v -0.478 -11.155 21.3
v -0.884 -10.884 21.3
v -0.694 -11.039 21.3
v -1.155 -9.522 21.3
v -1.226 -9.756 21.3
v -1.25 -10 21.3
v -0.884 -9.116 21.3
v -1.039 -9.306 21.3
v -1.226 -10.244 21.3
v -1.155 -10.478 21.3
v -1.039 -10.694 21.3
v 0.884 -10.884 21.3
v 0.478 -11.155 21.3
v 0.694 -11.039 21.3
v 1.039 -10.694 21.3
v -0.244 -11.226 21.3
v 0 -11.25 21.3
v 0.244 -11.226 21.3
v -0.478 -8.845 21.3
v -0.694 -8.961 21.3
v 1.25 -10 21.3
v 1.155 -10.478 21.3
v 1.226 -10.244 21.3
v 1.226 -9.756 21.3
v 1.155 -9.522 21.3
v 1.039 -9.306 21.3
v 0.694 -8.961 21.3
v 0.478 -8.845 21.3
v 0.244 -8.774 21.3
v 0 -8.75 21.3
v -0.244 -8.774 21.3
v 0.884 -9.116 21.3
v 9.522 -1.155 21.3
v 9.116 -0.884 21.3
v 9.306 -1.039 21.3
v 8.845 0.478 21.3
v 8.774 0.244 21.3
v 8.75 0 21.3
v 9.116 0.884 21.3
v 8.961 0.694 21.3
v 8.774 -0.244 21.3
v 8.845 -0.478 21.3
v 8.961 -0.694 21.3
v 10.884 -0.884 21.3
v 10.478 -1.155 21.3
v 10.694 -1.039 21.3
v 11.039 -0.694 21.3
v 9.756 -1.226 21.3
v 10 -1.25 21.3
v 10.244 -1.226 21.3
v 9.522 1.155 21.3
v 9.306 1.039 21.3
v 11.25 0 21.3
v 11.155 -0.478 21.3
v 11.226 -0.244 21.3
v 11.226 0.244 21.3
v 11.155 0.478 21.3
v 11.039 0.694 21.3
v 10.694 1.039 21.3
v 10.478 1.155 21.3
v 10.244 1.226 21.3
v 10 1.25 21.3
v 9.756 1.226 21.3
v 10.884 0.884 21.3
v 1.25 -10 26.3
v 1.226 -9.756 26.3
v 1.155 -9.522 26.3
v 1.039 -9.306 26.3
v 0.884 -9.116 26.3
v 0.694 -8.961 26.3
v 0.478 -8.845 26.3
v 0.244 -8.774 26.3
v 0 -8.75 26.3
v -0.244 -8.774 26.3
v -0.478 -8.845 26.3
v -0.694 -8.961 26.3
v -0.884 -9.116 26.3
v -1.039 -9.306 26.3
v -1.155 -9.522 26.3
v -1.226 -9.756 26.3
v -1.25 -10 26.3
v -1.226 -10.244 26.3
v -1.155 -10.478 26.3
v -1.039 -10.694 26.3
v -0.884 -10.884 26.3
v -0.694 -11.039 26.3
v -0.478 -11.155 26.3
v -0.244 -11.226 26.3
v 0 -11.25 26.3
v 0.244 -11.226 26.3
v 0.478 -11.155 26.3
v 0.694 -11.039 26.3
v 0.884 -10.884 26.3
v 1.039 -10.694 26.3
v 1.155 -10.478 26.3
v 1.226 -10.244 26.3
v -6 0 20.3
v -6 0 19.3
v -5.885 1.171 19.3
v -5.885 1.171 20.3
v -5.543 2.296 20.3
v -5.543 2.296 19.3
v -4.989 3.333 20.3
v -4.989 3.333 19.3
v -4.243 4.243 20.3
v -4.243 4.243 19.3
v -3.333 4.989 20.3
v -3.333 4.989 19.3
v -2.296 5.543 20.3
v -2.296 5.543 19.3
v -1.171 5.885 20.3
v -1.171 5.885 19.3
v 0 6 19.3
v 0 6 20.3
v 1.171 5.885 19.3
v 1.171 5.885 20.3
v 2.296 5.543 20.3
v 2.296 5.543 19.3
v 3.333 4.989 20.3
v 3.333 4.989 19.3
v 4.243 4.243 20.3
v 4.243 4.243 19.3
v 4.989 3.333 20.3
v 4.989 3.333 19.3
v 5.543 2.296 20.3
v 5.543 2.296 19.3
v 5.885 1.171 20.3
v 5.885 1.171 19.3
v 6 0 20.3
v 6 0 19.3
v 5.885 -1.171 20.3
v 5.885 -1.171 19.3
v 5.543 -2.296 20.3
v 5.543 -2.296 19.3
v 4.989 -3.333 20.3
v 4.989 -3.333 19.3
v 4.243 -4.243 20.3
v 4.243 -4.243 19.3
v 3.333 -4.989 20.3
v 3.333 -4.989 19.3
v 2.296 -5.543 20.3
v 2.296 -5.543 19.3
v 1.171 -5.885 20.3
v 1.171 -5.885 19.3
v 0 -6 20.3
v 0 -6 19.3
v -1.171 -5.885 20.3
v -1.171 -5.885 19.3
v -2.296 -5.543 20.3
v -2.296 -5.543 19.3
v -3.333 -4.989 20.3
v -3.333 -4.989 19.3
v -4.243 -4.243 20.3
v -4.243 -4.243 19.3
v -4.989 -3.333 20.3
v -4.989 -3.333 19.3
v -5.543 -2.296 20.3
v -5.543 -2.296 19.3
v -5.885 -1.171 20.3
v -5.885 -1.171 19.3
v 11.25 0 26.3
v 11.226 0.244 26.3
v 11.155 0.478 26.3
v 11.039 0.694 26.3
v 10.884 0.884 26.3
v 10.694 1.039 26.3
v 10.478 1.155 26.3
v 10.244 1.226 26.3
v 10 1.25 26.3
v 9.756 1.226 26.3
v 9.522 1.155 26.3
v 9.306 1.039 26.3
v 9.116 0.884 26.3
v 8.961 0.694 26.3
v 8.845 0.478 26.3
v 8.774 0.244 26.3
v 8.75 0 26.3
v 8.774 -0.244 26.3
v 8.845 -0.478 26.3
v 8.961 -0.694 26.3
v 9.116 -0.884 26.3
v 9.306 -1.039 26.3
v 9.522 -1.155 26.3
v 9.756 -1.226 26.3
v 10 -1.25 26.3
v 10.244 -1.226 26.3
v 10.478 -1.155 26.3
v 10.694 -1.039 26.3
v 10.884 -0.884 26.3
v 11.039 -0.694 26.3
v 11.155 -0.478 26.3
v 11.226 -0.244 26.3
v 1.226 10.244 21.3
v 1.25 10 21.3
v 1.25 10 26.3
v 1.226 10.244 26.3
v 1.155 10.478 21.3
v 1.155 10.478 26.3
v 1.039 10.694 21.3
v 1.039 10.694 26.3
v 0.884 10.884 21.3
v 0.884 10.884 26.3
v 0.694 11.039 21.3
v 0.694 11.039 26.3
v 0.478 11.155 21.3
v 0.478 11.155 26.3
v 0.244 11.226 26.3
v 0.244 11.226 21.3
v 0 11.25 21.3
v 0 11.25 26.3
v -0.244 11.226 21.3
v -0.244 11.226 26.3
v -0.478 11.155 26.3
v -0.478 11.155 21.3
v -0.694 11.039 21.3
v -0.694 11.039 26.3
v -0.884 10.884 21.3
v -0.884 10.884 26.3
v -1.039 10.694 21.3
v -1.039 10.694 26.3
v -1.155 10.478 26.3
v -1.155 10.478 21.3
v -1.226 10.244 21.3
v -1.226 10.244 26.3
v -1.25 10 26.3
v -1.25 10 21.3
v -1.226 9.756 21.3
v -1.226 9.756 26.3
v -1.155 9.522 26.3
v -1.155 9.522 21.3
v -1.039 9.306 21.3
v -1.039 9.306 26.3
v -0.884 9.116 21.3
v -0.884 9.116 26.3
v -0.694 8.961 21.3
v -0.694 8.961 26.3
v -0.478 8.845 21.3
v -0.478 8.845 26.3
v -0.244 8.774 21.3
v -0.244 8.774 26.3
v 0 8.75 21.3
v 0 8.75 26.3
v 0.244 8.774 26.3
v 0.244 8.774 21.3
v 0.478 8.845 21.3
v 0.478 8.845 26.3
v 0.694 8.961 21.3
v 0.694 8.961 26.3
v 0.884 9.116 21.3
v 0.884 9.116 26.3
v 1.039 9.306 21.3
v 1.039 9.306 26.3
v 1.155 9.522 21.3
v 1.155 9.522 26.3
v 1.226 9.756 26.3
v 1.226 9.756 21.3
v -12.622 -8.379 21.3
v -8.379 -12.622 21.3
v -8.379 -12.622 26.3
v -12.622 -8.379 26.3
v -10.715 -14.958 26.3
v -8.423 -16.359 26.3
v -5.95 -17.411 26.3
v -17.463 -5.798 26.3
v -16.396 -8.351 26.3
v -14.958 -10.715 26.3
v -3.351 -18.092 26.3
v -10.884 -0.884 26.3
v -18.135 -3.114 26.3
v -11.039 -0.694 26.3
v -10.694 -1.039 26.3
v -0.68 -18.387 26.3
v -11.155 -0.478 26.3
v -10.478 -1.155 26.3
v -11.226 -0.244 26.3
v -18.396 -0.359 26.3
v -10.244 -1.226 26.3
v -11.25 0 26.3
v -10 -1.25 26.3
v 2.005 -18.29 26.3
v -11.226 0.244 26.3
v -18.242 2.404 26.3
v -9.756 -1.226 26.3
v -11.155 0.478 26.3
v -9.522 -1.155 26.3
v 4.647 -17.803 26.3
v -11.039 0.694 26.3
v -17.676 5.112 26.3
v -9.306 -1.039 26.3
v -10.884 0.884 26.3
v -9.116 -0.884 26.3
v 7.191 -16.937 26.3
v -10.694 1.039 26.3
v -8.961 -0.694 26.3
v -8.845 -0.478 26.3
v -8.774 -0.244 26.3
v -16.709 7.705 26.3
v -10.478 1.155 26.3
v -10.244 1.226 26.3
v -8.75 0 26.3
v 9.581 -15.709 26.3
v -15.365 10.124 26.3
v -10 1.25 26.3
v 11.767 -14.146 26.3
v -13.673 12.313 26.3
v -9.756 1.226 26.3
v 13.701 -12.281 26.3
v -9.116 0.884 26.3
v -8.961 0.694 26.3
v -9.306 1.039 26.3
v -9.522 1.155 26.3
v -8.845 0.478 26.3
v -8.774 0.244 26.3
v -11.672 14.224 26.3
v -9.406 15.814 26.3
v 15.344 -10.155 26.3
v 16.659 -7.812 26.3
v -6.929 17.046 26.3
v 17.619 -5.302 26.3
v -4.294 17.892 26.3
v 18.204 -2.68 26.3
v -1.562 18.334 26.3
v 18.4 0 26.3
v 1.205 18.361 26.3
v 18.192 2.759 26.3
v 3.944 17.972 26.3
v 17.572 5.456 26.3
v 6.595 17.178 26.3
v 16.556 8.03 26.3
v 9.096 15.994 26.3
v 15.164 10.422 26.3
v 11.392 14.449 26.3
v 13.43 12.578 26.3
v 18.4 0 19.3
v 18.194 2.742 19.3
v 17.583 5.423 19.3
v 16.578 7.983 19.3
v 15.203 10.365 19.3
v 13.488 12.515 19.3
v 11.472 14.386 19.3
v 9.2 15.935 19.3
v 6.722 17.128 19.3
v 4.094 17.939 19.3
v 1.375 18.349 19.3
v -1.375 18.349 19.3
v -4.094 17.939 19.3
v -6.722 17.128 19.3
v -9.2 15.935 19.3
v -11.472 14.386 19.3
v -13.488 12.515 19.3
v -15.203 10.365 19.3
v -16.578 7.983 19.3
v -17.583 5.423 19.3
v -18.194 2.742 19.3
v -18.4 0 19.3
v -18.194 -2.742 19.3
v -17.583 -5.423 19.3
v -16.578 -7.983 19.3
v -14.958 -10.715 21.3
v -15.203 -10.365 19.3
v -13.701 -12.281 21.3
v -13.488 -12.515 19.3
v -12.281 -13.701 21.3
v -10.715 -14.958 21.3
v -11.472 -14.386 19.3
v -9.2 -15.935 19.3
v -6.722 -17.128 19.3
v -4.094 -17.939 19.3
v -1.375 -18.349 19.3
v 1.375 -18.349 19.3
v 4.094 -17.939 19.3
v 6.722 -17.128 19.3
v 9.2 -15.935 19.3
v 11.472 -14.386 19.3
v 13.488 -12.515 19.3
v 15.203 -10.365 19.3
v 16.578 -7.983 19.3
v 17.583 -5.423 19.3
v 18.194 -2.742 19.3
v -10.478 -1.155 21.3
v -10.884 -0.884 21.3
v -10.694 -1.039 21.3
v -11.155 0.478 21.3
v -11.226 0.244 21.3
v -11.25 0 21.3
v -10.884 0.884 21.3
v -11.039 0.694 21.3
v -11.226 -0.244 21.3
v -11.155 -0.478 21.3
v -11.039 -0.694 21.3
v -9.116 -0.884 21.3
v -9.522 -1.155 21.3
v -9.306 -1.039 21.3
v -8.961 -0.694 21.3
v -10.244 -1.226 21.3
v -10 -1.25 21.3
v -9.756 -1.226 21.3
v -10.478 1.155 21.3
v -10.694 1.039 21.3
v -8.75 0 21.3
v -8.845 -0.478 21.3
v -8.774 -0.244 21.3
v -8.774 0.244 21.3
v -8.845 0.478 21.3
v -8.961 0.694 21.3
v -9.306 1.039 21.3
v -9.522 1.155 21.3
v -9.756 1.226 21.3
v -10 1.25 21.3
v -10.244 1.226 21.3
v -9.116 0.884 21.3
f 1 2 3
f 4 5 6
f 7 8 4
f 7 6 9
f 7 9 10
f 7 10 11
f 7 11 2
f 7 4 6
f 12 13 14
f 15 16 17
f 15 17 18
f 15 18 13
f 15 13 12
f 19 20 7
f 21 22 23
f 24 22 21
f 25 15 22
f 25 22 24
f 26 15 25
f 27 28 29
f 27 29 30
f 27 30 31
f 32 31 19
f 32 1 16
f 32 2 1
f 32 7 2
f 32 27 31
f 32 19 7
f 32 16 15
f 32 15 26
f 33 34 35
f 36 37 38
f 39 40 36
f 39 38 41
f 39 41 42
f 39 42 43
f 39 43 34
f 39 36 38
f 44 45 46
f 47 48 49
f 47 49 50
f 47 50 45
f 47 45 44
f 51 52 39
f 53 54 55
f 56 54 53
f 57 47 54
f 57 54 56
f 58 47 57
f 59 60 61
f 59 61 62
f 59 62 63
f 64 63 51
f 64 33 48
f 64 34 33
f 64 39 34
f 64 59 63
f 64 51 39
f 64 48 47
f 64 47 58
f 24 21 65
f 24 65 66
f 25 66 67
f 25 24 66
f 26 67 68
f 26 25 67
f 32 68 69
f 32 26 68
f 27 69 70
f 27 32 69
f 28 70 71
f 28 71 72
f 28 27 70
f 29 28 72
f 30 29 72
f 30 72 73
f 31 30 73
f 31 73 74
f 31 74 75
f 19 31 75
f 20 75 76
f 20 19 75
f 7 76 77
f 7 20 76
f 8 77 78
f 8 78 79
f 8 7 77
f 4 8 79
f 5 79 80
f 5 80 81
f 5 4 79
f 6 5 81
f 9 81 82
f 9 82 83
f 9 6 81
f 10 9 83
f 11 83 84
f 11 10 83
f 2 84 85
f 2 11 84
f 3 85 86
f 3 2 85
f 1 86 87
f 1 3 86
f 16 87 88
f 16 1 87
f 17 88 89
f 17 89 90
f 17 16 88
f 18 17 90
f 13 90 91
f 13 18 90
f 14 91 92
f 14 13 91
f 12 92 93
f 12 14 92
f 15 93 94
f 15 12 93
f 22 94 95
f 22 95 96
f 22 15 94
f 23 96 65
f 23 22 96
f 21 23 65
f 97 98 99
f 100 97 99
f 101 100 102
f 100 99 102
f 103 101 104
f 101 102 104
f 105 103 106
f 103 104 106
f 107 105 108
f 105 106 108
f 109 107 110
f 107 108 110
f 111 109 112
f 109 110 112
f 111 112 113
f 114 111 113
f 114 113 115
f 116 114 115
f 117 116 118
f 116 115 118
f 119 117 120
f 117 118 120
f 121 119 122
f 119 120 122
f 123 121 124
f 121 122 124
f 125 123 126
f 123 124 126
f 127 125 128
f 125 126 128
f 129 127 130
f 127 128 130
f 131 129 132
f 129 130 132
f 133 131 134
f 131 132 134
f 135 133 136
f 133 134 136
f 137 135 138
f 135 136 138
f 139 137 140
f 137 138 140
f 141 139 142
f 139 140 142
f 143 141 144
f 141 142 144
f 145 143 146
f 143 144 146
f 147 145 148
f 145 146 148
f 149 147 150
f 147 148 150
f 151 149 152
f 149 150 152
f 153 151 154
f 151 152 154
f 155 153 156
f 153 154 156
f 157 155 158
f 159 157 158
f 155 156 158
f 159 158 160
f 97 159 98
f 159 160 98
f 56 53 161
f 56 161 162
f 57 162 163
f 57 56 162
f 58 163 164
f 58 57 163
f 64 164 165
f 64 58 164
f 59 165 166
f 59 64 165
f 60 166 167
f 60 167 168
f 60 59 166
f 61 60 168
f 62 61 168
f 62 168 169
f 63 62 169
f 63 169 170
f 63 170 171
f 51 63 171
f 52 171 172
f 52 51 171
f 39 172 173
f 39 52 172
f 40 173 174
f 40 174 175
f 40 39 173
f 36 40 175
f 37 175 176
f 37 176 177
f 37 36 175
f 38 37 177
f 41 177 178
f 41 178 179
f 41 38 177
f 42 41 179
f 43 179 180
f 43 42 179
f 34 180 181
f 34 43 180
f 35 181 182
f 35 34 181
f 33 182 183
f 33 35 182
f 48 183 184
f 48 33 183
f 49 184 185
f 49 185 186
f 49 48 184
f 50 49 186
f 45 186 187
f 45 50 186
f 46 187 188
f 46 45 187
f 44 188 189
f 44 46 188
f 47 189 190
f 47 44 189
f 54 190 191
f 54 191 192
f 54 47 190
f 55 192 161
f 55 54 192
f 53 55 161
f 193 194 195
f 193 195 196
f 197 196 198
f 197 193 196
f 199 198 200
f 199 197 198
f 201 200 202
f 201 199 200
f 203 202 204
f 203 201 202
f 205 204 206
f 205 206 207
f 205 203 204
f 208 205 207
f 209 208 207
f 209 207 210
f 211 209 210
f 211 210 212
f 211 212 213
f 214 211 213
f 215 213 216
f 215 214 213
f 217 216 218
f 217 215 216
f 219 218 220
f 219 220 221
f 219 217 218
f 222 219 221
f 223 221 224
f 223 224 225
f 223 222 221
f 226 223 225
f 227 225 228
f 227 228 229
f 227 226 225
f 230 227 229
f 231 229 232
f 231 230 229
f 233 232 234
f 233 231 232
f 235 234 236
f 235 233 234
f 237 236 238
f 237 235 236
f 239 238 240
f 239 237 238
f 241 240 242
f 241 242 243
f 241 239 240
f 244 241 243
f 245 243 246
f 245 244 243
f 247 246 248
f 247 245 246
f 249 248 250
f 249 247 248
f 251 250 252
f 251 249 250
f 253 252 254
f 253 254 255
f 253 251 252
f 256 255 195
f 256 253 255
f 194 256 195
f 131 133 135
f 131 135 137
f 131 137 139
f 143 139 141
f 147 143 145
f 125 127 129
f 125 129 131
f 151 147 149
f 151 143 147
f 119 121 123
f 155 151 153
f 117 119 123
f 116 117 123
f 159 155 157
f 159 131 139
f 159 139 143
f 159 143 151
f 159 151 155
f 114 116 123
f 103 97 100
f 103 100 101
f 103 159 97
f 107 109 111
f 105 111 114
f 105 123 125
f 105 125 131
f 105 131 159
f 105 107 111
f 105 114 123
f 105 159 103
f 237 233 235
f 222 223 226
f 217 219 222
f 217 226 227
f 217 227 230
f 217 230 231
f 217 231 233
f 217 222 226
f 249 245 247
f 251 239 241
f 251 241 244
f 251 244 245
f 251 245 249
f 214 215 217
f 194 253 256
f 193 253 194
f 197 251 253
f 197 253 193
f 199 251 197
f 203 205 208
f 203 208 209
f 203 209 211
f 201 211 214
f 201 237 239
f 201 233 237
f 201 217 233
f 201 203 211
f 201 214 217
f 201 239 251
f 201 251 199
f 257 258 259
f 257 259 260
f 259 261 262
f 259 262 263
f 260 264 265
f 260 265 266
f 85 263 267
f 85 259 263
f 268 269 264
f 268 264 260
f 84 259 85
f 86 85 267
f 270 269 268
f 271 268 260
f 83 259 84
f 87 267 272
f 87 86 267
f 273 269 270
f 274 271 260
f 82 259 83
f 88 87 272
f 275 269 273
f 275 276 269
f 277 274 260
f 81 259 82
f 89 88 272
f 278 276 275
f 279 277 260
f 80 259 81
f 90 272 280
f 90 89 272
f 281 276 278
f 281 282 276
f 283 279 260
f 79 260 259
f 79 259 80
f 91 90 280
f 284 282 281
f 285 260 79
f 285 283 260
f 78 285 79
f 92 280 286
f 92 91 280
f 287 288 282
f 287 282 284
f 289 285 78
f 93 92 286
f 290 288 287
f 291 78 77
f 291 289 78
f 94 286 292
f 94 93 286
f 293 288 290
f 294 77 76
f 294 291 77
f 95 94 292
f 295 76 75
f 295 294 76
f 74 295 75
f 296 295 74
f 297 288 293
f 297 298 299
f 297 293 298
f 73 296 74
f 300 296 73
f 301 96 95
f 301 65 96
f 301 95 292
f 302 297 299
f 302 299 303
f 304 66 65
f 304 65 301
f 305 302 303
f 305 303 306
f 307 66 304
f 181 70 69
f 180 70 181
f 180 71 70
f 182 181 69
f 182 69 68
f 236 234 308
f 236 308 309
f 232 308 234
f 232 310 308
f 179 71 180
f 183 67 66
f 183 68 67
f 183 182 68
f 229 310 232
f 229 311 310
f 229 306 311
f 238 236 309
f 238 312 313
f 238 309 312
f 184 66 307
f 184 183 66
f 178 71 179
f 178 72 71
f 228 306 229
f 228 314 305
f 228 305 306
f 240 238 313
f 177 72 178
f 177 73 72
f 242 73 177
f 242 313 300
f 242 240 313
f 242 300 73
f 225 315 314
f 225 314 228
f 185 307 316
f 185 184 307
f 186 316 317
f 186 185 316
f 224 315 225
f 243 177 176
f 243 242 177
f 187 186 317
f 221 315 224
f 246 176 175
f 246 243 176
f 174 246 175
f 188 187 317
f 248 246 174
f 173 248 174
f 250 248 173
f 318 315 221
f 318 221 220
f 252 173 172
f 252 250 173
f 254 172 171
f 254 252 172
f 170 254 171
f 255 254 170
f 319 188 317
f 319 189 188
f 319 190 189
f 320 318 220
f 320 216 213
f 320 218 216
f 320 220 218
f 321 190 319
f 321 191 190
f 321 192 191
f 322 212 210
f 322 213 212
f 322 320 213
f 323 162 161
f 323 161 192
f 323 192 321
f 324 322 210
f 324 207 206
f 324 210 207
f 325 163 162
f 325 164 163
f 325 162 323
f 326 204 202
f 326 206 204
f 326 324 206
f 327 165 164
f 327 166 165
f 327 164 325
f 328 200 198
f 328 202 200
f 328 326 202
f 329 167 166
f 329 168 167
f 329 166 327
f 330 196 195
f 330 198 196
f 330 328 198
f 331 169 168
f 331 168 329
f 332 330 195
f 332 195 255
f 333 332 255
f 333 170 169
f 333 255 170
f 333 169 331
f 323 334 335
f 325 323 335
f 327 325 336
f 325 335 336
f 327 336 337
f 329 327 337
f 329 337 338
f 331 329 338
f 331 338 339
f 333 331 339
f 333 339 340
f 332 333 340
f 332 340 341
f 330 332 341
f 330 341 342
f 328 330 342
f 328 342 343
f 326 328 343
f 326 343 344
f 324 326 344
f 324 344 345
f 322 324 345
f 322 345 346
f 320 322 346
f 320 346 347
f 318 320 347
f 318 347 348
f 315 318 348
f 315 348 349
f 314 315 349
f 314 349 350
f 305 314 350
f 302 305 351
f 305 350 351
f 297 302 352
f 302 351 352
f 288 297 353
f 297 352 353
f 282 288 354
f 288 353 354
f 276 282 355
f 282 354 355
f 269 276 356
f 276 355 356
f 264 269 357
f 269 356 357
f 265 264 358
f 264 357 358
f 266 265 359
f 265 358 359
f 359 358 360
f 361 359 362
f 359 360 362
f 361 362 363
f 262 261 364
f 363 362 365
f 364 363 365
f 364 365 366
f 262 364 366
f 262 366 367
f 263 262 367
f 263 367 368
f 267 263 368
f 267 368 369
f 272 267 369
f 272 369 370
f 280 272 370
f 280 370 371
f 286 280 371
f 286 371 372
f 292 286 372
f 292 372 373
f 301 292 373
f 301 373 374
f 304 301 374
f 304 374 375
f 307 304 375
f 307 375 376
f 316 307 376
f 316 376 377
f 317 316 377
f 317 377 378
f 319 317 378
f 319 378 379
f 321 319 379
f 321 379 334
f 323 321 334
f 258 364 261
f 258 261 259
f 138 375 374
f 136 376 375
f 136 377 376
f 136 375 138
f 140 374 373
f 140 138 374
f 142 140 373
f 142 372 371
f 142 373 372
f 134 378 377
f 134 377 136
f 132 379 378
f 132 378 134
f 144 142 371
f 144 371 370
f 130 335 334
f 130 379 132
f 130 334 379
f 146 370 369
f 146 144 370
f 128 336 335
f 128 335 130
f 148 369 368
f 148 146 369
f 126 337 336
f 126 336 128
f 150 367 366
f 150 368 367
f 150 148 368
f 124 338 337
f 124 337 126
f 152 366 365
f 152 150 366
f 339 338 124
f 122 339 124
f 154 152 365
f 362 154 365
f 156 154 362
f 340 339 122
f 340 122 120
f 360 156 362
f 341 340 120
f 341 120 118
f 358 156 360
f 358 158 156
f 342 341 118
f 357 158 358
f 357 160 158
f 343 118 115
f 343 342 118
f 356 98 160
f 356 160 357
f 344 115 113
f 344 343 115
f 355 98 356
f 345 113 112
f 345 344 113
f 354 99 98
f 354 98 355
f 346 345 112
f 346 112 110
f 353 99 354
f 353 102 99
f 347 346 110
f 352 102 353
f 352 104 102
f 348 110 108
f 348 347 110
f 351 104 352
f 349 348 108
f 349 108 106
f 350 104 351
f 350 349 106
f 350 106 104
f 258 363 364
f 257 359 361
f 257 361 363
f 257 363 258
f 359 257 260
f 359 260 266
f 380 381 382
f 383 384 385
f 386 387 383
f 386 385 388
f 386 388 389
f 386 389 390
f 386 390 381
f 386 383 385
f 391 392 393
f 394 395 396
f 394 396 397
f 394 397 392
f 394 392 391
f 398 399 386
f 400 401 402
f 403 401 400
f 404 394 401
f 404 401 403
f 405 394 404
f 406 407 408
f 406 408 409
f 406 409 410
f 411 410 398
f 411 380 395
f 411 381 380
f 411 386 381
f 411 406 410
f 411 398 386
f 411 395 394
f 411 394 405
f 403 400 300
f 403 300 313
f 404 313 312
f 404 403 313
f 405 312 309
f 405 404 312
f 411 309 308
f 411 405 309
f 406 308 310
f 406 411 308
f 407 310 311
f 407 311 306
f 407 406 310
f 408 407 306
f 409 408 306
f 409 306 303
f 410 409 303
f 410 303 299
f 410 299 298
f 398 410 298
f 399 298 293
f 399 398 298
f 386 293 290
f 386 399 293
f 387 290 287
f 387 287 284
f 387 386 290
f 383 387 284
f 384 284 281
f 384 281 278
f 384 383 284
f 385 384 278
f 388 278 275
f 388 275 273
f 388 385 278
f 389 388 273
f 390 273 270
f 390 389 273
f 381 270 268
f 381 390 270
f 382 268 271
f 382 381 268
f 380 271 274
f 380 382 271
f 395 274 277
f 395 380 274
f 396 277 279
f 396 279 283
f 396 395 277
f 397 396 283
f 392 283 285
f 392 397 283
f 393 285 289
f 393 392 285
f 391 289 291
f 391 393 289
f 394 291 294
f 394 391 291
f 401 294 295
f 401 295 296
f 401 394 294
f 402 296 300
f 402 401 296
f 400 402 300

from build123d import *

# Parameters (mm, degrees)
CROQUIS1_R              = 18.4
SALIENTE_EXTRUIR1_DEPTH = 26.3
CORTAR_EXTRUIR1_START   = -5
CROQUIS2_R              = 1.25
CORTAR_EXTRUIR1_DEPTH   = 5
CROQUIS3_R              = 1.25
CORTAR_EXTRUIR2_DEPTH   = 5
CROQUIS7_R              = 18.4
CORTAR_EXTRUIR5_DEPTH   = 19.3
CROQUIS8_R              = 6
CORTAR_EXTRUIR6_DEPTH   = 1


with BuildPart() as part:
    # Croquis1 → Saliente-Extruir1 (new body)
    with BuildSketch(Plane.XY):
        Circle(CROQUIS1_R)
    extrude(amount=SALIENTE_EXTRUIR1_DEPTH)

    # Croquis2 → Cortar-Extruir1 (cut)
    with BuildSketch(Plane.XY.offset(26.3).offset(CORTAR_EXTRUIR1_START)):
        with Locations((0, 10)):
            Circle(CROQUIS2_R)
        with Locations((10, 0)):
            Circle(CROQUIS2_R)
        with Locations((0, -10)):
            Circle(CROQUIS2_R)
        with Locations((-10, 0)):
            Circle(CROQUIS2_R)
        with BuildLine():
            Line((-8.379185723, -12.62182641), (-12.62182641, -8.379185723))
            Line((-12.62182641, -8.379185723), (-14.957986577, -10.71534589))
            ThreePointArc((-14.957986577, -10.71534589), (-13.010764774, -13.010764774), (-10.71534589, -14.957986577))
            Line((-10.71534589, -14.957986577), (-8.379185723, -12.62182641))
        make_face()
    extrude(amount=CORTAR_EXTRUIR1_DEPTH, mode=Mode.SUBTRACT)

    # Croquis3 → Cortar-Extruir2 (cut)
    with BuildSketch(Plane(origin=(0, 0, 0), x_dir=(-1, 0, 0), z_dir=(0, 0, -1))):
        with Locations(Location((-10, 0, 0), (0, 0, 180))):
            Circle(CROQUIS3_R)
        with Locations(Location((0, 10, 0), (0, 0, 180))):
            Circle(CROQUIS3_R)
        with Locations(Location((10, 0, 0), (0, 0, 180))):
            Circle(CROQUIS3_R)
        with Locations(Location((0, -10, 0), (0, 0, 180))):
            Circle(CROQUIS3_R)
    extrude(amount=-CORTAR_EXTRUIR2_DEPTH, mode=Mode.SUBTRACT)

    # Croquis7 → Cortar-Extruir5 (cut)
    with BuildSketch(Plane(origin=(0, 0, 0), x_dir=(-1, 0, 0), z_dir=(0, 0, -1))):
        Circle(CROQUIS7_R)
    extrude(amount=-CORTAR_EXTRUIR5_DEPTH, mode=Mode.SUBTRACT)

    # Croquis8 → Cortar-Extruir6 (cut)
    with BuildSketch(Plane(origin=(0, 0, 19.3), x_dir=(-1, 0, 0), z_dir=(0, 0, -1))):
        Circle(CROQUIS8_R)
    extrude(amount=-CORTAR_EXTRUIR6_DEPTH, mode=Mode.SUBTRACT)


solid = part.part
